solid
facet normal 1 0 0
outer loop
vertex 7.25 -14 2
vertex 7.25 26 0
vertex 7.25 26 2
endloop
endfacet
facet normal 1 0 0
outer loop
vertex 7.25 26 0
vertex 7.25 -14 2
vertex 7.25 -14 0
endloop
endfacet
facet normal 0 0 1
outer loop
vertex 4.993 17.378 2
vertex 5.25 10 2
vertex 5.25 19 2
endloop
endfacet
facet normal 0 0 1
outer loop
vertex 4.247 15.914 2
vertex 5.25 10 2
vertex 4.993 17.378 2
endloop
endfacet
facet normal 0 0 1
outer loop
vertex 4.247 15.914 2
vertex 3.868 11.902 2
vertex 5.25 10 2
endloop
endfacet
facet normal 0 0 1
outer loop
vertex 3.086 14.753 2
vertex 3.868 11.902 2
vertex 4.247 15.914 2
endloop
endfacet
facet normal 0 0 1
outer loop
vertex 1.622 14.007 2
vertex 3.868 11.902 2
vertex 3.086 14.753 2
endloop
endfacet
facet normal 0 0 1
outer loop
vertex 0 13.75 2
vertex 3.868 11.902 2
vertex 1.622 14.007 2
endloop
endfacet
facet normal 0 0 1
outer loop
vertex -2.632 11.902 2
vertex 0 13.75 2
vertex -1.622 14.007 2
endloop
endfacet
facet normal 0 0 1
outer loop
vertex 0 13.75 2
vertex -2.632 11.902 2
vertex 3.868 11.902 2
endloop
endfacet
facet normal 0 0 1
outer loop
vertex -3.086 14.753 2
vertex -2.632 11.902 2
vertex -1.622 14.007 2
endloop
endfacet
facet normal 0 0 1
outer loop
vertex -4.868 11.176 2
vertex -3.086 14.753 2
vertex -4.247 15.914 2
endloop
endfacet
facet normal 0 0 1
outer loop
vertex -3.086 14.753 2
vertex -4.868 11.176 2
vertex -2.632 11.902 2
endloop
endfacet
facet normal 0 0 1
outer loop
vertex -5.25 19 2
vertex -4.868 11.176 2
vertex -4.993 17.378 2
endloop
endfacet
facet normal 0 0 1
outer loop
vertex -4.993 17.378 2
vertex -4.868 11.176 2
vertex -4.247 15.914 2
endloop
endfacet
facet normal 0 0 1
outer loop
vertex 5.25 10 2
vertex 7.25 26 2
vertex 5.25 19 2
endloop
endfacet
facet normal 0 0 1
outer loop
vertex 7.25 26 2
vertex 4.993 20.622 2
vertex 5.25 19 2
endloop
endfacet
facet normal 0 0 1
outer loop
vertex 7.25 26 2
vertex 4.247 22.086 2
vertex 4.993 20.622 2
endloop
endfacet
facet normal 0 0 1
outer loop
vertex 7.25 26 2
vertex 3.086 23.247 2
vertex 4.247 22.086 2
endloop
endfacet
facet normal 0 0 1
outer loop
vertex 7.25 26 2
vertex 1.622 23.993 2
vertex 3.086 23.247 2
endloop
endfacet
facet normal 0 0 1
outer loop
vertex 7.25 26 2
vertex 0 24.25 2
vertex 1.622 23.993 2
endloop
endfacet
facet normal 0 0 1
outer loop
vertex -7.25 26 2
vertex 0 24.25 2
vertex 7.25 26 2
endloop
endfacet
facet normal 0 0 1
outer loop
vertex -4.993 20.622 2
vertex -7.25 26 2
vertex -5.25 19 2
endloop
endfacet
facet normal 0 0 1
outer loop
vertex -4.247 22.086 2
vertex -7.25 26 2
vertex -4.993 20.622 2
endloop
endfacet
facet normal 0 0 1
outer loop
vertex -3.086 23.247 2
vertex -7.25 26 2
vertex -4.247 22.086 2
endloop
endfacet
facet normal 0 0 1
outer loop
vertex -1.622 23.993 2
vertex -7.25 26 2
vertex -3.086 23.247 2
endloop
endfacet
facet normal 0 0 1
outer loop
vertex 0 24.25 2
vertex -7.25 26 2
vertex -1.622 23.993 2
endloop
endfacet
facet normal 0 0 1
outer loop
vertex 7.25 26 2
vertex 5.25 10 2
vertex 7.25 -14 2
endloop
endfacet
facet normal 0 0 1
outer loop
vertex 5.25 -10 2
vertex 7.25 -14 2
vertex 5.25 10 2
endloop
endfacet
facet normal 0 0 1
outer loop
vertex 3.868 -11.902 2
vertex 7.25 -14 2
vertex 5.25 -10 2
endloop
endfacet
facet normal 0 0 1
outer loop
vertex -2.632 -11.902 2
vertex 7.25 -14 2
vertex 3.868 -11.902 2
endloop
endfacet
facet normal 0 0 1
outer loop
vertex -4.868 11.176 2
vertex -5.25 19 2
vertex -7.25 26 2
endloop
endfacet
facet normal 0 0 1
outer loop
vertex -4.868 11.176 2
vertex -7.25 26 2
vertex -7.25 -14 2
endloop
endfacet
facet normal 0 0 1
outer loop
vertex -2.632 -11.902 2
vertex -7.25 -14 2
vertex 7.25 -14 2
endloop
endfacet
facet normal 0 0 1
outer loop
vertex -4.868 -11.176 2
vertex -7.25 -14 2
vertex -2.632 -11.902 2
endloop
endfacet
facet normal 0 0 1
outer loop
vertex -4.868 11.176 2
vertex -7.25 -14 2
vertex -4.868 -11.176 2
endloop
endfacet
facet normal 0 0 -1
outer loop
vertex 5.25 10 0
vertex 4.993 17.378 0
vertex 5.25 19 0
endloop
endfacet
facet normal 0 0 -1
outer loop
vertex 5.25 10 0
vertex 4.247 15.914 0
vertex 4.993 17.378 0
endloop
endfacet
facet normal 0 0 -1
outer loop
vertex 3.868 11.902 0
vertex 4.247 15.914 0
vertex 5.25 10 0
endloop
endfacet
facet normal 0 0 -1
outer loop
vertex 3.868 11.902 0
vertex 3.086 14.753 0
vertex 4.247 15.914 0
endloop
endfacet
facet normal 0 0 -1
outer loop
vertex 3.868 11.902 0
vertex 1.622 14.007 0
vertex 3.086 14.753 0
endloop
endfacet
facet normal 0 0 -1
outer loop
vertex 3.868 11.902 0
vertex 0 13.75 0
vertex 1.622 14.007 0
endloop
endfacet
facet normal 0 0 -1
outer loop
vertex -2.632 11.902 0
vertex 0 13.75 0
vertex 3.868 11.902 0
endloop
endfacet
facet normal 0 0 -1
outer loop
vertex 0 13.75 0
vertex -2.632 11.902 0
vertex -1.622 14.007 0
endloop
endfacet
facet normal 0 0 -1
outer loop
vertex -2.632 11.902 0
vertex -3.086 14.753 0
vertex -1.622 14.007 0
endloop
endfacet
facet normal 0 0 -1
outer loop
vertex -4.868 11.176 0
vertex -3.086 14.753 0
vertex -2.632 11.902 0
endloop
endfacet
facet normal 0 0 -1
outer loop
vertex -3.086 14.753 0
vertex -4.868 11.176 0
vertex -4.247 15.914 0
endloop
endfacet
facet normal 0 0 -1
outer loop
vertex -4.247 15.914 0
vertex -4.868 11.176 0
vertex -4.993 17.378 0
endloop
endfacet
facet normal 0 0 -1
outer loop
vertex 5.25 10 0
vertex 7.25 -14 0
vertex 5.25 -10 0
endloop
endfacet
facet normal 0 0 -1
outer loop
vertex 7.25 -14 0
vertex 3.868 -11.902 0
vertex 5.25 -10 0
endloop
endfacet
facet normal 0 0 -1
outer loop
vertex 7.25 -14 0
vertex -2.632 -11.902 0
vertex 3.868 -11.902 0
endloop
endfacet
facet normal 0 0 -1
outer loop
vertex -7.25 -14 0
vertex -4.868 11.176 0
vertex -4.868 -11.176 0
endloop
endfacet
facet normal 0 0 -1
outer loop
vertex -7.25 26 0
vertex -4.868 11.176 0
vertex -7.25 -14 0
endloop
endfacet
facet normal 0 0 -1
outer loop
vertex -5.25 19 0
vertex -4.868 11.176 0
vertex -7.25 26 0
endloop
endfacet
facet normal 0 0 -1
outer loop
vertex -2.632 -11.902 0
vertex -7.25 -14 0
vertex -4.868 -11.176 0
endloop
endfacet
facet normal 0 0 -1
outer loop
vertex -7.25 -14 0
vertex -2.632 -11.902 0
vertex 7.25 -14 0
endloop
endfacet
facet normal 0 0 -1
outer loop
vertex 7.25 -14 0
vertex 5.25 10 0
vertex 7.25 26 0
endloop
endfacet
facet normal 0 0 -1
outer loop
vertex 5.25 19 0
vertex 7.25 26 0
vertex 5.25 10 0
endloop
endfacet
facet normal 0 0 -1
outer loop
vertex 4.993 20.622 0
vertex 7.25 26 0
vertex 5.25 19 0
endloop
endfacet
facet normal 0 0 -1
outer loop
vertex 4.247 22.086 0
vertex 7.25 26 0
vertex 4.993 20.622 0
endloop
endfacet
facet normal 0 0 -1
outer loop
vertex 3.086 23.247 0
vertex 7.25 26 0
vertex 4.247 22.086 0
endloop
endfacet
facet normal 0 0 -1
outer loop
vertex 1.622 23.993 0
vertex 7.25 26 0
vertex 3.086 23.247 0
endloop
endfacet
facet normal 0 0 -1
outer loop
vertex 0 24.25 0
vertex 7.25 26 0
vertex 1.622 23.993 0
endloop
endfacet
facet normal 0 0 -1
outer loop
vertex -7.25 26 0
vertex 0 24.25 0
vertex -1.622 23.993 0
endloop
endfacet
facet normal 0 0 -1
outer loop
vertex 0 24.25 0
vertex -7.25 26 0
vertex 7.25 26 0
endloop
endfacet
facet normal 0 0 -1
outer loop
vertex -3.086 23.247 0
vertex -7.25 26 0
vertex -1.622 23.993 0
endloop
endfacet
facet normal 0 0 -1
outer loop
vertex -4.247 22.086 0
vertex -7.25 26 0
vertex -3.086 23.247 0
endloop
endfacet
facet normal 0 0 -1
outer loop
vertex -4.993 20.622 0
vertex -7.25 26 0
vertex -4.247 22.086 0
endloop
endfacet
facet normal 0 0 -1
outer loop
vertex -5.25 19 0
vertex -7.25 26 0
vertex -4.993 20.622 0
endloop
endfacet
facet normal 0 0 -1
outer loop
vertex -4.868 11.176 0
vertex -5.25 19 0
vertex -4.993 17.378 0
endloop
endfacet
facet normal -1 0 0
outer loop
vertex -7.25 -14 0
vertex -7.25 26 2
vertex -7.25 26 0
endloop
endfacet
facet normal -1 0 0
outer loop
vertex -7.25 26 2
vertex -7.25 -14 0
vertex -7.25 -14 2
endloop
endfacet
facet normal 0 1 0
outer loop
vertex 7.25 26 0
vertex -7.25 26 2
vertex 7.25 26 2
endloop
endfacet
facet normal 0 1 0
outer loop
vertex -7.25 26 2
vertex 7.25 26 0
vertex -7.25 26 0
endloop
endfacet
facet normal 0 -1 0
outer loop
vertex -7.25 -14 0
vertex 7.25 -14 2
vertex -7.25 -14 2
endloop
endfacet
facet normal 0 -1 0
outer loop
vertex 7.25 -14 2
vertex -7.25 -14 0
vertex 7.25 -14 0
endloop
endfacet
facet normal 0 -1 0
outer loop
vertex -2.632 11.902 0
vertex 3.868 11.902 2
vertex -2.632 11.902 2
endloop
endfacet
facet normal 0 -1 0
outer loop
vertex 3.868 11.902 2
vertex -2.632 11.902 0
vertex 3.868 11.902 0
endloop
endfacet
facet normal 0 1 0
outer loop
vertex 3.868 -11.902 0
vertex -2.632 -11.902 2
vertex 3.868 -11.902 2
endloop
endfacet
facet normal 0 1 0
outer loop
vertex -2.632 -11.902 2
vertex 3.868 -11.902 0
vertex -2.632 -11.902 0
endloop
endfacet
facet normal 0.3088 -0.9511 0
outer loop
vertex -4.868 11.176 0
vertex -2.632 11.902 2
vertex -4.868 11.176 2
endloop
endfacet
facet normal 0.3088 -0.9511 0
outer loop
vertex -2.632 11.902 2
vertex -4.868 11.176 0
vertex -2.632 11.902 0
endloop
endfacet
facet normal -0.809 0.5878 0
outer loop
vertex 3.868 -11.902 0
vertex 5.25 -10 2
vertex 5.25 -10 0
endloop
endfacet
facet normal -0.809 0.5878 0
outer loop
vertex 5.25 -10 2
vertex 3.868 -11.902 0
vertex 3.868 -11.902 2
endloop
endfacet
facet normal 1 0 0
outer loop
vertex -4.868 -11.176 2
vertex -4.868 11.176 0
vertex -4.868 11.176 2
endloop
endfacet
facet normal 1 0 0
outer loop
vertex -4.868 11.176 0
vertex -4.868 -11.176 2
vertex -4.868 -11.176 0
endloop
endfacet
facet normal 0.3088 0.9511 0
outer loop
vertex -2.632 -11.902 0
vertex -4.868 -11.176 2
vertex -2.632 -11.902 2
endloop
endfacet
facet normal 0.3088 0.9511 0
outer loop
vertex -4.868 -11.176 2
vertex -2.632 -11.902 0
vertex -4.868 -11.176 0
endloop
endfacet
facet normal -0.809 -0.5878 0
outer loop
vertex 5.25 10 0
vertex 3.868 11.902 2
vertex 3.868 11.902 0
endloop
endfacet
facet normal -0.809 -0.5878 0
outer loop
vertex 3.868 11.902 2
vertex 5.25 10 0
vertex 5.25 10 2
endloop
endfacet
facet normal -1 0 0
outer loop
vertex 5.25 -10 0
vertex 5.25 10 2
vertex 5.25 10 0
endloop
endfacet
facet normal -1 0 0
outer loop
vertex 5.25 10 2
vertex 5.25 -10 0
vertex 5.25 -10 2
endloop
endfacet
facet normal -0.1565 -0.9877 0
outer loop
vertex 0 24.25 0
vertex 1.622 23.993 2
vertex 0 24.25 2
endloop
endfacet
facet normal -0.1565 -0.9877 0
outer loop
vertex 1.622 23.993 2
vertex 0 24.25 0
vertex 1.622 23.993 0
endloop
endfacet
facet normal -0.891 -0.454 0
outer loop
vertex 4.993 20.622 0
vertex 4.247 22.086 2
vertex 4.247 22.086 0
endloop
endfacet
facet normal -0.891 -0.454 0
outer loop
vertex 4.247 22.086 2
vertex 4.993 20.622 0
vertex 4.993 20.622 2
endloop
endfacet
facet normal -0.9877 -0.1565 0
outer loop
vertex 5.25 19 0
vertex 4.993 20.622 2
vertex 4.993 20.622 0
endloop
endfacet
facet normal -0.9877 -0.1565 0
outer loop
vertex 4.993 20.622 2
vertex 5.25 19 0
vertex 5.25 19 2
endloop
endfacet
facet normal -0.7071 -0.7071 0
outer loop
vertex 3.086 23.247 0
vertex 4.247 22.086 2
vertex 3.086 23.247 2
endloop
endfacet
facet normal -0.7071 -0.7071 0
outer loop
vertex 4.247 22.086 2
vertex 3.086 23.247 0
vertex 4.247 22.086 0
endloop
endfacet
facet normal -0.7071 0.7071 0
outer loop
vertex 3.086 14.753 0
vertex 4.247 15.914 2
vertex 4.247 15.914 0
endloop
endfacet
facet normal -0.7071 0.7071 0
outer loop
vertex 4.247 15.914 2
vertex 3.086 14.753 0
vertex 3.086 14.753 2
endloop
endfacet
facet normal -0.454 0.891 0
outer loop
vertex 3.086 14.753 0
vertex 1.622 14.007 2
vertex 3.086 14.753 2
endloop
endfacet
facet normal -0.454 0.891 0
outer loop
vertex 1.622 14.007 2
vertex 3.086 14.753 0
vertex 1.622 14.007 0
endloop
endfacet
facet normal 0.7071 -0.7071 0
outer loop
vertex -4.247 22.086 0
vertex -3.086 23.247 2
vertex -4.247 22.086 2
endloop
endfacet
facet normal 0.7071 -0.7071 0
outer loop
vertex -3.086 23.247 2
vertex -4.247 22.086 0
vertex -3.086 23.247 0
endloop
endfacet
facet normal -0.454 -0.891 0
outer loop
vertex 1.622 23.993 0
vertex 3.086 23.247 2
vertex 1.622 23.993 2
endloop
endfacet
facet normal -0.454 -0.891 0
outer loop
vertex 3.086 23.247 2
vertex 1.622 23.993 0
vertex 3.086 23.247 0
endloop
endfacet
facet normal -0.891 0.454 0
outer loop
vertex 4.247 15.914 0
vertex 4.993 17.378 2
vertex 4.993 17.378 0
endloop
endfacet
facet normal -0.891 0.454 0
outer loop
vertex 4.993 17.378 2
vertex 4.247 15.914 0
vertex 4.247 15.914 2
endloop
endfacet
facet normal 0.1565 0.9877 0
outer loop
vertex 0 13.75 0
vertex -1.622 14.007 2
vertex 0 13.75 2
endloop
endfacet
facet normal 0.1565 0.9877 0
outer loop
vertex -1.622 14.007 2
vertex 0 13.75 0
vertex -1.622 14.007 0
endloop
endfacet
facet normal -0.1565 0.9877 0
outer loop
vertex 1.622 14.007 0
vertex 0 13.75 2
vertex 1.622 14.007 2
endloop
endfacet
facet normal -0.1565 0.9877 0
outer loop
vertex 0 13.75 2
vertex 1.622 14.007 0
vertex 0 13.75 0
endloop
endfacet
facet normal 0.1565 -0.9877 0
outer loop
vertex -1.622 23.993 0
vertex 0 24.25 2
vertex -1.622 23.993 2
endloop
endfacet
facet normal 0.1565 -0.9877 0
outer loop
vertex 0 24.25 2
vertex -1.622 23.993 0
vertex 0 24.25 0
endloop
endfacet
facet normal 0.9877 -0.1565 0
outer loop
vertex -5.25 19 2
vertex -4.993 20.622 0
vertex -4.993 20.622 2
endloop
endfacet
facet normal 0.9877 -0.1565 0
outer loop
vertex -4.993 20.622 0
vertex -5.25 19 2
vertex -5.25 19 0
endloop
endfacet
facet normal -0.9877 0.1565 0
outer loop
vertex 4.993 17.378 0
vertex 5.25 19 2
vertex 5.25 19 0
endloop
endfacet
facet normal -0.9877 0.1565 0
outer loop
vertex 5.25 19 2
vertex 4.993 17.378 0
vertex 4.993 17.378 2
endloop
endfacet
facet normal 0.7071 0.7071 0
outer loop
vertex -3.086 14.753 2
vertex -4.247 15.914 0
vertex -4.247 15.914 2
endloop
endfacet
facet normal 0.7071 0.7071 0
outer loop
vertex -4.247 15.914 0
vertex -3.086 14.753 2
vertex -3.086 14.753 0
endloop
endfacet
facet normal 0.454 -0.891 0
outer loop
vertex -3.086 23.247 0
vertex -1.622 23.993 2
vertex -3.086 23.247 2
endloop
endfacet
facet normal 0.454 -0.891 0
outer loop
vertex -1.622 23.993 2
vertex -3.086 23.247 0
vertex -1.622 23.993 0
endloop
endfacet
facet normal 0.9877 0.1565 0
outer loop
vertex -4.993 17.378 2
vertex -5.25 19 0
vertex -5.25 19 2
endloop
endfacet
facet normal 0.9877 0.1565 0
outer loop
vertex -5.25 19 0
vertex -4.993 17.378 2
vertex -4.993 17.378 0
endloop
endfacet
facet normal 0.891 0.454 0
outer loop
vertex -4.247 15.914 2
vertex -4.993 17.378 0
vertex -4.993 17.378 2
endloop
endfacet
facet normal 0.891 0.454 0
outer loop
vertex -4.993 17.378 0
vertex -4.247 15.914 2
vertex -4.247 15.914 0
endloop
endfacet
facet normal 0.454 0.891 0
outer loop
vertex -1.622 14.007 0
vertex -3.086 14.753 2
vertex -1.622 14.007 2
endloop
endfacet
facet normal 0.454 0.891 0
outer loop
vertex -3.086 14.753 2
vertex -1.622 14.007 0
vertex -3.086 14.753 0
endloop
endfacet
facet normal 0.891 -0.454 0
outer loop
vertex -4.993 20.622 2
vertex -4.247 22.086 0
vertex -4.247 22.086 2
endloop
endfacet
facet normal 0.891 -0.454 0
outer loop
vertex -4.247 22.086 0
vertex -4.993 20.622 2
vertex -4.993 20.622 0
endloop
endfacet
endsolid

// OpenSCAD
//VARIABLES

//Resolution
RES = 20;
//Case diameter adjustment
CDA = 0.5;
//Sieve thickness
STN = 2;

//MODULES 


//Holes
module hole(){
    $fn=RES/4;
translate([-(6+CDA)/2,-10,0])
minkowski()
{
  cube([6+CDA,20,STN/2]);
  cylinder(r=2,h=STN/2);
}
}



//SAMPLE
difference(){translate([0,5+STN/2,STN/2])cube([10+CDA+STN*2,24+10+STN*3,STN],true);hole();translate([0,17+STN,0])cylinder(d=10+CDA,STN,$fn=RES);} 
